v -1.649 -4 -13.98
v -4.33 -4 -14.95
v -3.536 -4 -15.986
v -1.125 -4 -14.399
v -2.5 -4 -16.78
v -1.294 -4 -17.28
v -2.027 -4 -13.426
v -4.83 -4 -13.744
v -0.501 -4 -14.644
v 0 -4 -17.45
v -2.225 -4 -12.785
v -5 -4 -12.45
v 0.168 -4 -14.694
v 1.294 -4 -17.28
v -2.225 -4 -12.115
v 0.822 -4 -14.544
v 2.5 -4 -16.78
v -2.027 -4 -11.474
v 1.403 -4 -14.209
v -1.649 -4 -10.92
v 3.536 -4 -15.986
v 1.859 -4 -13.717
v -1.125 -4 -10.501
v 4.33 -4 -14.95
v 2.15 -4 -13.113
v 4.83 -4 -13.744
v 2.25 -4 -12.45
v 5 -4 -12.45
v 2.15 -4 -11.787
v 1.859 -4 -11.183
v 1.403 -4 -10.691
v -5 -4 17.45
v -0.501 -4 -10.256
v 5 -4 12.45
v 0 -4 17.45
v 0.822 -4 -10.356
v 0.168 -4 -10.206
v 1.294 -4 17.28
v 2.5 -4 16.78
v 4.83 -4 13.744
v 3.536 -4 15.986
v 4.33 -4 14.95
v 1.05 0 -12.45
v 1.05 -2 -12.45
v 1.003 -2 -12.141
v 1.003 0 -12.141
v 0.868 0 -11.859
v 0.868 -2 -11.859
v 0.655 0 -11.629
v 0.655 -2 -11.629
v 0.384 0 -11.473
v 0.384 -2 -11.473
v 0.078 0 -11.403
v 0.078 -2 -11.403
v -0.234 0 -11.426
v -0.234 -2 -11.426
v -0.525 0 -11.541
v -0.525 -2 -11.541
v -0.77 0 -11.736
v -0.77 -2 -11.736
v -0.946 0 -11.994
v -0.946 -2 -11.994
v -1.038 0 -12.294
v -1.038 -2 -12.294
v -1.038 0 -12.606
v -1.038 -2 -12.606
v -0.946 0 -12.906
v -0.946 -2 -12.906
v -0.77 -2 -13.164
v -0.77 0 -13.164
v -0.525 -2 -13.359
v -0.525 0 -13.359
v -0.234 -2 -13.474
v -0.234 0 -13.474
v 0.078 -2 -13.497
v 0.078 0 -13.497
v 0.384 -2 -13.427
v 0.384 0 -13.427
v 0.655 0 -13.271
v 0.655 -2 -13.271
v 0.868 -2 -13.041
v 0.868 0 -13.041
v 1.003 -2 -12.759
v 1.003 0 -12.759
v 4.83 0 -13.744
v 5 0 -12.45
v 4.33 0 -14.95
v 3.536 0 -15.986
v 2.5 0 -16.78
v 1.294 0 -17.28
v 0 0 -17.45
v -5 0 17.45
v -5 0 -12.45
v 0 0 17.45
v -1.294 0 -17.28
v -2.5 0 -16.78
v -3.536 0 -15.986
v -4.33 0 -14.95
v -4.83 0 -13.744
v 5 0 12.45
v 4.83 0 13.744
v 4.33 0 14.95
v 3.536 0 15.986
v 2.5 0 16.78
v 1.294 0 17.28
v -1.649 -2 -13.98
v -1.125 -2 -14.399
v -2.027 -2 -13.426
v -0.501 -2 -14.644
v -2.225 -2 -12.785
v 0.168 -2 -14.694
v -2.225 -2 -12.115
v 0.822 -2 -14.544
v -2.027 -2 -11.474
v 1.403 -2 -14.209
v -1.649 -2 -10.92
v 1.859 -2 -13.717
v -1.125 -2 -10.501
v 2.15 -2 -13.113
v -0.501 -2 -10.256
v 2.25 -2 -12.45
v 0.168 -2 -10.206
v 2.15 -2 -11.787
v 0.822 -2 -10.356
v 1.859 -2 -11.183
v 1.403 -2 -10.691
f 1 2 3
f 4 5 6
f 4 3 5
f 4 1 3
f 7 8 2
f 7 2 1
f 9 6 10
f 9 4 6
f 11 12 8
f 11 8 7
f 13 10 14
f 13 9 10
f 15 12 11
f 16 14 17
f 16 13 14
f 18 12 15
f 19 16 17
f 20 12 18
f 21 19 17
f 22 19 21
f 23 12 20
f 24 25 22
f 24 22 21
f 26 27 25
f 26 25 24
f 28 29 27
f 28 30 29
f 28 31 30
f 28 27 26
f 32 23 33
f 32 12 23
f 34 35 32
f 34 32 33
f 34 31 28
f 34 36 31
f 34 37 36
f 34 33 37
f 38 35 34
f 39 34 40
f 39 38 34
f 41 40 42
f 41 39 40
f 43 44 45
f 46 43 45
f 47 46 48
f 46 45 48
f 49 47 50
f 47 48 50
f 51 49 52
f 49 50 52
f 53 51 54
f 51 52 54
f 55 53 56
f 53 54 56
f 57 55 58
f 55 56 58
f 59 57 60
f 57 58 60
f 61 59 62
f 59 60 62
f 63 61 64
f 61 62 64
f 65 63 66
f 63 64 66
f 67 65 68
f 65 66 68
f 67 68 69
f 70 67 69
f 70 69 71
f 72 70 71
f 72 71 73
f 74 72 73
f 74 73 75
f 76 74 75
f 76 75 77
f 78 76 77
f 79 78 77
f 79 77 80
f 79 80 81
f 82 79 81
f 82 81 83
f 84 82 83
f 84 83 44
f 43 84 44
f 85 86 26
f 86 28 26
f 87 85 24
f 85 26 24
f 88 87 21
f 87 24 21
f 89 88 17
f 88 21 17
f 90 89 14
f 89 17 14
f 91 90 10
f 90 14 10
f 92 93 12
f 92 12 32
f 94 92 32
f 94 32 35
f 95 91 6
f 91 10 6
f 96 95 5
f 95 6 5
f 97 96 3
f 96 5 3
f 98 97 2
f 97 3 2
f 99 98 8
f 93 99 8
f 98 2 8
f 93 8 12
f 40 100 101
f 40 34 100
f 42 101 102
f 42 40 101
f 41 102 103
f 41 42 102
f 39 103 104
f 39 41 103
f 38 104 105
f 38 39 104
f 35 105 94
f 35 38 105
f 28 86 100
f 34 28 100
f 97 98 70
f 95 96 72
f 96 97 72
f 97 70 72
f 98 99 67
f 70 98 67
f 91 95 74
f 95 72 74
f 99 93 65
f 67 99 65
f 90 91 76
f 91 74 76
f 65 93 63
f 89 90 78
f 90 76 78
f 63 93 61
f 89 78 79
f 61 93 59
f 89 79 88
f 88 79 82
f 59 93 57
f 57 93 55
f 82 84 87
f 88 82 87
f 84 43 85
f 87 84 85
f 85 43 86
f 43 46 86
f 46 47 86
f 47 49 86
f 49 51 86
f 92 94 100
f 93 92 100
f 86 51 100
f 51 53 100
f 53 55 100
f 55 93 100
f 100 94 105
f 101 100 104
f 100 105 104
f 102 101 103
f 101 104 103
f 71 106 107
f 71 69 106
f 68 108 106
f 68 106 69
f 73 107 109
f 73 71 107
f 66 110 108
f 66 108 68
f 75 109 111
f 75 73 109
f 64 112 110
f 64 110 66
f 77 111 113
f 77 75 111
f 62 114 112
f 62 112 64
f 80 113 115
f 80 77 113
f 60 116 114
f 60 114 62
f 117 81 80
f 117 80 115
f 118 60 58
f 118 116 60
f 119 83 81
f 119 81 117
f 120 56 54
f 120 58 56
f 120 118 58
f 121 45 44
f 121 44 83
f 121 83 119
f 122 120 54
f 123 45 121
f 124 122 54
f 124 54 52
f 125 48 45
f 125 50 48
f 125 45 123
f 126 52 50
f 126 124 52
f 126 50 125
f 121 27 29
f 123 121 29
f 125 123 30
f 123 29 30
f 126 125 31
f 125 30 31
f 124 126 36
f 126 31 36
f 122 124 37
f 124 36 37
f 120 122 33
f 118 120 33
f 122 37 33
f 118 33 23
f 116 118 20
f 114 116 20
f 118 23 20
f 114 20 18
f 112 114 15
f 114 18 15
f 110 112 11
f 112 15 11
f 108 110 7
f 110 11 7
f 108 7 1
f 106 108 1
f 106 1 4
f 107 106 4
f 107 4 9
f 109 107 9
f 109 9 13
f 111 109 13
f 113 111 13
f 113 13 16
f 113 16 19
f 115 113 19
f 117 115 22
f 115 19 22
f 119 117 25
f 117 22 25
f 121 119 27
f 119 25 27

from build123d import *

# Parameters (mm, degrees)
F0_W     = 10
F0_H     = 34.9
F1_DEPTH = 4
F2_R     = 5
F3_R     = 4.99999
F4_R     = 2.25
F4_R_2   = 1.05
F5_DEPTH = 2
F6_DEPTH = 5


# Not quite as in the source:
# - a fillet or chamfer is up to 0.001 mm smaller than in the source, because OpenCascade refuses the exact size


with BuildPart() as f1:
    # F0 (on Front) → F1 (new body)
    with BuildSketch(Plane.XZ):
        Rectangle(F0_W, F0_H)
    extrude(amount=F1_DEPTH)

    # F2
    f2_edges = [f1.edges().sort_by_distance(p)[0] for p in [
        (5, -2, 17.45),
    ]]
    fillet(f2_edges, radius=F2_R)

    # F3 (radius 5 in the source; OpenCascade refuses exactly that, so slightly less here)
    f3_edges = [f1.edges().sort_by_distance(p)[0] for p in [
        (5, -2, -17.45),
        (-5, -2, -17.45),
    ]]
    fillet(f3_edges, radius=F3_R)

    # F4 (on face) → F5 (cut)
    with BuildSketch(Plane.XZ.offset(4)):
        with Locations((0, -12.45)):
            Circle(F4_R)
        with Locations((0, -12.45)):
            Circle(F4_R_2, mode=Mode.SUBTRACT)
    extrude(amount=-F5_DEPTH, mode=Mode.SUBTRACT)

    # F6 (cut): a face of the model
    f6_faces = [f1.faces().sort_by_distance(p)[0] for p in [
        (0, -4, -12.45),
    ]]
    extrude(f6_faces, amount=-F6_DEPTH, mode=Mode.SUBTRACT)


solid = f1.part
